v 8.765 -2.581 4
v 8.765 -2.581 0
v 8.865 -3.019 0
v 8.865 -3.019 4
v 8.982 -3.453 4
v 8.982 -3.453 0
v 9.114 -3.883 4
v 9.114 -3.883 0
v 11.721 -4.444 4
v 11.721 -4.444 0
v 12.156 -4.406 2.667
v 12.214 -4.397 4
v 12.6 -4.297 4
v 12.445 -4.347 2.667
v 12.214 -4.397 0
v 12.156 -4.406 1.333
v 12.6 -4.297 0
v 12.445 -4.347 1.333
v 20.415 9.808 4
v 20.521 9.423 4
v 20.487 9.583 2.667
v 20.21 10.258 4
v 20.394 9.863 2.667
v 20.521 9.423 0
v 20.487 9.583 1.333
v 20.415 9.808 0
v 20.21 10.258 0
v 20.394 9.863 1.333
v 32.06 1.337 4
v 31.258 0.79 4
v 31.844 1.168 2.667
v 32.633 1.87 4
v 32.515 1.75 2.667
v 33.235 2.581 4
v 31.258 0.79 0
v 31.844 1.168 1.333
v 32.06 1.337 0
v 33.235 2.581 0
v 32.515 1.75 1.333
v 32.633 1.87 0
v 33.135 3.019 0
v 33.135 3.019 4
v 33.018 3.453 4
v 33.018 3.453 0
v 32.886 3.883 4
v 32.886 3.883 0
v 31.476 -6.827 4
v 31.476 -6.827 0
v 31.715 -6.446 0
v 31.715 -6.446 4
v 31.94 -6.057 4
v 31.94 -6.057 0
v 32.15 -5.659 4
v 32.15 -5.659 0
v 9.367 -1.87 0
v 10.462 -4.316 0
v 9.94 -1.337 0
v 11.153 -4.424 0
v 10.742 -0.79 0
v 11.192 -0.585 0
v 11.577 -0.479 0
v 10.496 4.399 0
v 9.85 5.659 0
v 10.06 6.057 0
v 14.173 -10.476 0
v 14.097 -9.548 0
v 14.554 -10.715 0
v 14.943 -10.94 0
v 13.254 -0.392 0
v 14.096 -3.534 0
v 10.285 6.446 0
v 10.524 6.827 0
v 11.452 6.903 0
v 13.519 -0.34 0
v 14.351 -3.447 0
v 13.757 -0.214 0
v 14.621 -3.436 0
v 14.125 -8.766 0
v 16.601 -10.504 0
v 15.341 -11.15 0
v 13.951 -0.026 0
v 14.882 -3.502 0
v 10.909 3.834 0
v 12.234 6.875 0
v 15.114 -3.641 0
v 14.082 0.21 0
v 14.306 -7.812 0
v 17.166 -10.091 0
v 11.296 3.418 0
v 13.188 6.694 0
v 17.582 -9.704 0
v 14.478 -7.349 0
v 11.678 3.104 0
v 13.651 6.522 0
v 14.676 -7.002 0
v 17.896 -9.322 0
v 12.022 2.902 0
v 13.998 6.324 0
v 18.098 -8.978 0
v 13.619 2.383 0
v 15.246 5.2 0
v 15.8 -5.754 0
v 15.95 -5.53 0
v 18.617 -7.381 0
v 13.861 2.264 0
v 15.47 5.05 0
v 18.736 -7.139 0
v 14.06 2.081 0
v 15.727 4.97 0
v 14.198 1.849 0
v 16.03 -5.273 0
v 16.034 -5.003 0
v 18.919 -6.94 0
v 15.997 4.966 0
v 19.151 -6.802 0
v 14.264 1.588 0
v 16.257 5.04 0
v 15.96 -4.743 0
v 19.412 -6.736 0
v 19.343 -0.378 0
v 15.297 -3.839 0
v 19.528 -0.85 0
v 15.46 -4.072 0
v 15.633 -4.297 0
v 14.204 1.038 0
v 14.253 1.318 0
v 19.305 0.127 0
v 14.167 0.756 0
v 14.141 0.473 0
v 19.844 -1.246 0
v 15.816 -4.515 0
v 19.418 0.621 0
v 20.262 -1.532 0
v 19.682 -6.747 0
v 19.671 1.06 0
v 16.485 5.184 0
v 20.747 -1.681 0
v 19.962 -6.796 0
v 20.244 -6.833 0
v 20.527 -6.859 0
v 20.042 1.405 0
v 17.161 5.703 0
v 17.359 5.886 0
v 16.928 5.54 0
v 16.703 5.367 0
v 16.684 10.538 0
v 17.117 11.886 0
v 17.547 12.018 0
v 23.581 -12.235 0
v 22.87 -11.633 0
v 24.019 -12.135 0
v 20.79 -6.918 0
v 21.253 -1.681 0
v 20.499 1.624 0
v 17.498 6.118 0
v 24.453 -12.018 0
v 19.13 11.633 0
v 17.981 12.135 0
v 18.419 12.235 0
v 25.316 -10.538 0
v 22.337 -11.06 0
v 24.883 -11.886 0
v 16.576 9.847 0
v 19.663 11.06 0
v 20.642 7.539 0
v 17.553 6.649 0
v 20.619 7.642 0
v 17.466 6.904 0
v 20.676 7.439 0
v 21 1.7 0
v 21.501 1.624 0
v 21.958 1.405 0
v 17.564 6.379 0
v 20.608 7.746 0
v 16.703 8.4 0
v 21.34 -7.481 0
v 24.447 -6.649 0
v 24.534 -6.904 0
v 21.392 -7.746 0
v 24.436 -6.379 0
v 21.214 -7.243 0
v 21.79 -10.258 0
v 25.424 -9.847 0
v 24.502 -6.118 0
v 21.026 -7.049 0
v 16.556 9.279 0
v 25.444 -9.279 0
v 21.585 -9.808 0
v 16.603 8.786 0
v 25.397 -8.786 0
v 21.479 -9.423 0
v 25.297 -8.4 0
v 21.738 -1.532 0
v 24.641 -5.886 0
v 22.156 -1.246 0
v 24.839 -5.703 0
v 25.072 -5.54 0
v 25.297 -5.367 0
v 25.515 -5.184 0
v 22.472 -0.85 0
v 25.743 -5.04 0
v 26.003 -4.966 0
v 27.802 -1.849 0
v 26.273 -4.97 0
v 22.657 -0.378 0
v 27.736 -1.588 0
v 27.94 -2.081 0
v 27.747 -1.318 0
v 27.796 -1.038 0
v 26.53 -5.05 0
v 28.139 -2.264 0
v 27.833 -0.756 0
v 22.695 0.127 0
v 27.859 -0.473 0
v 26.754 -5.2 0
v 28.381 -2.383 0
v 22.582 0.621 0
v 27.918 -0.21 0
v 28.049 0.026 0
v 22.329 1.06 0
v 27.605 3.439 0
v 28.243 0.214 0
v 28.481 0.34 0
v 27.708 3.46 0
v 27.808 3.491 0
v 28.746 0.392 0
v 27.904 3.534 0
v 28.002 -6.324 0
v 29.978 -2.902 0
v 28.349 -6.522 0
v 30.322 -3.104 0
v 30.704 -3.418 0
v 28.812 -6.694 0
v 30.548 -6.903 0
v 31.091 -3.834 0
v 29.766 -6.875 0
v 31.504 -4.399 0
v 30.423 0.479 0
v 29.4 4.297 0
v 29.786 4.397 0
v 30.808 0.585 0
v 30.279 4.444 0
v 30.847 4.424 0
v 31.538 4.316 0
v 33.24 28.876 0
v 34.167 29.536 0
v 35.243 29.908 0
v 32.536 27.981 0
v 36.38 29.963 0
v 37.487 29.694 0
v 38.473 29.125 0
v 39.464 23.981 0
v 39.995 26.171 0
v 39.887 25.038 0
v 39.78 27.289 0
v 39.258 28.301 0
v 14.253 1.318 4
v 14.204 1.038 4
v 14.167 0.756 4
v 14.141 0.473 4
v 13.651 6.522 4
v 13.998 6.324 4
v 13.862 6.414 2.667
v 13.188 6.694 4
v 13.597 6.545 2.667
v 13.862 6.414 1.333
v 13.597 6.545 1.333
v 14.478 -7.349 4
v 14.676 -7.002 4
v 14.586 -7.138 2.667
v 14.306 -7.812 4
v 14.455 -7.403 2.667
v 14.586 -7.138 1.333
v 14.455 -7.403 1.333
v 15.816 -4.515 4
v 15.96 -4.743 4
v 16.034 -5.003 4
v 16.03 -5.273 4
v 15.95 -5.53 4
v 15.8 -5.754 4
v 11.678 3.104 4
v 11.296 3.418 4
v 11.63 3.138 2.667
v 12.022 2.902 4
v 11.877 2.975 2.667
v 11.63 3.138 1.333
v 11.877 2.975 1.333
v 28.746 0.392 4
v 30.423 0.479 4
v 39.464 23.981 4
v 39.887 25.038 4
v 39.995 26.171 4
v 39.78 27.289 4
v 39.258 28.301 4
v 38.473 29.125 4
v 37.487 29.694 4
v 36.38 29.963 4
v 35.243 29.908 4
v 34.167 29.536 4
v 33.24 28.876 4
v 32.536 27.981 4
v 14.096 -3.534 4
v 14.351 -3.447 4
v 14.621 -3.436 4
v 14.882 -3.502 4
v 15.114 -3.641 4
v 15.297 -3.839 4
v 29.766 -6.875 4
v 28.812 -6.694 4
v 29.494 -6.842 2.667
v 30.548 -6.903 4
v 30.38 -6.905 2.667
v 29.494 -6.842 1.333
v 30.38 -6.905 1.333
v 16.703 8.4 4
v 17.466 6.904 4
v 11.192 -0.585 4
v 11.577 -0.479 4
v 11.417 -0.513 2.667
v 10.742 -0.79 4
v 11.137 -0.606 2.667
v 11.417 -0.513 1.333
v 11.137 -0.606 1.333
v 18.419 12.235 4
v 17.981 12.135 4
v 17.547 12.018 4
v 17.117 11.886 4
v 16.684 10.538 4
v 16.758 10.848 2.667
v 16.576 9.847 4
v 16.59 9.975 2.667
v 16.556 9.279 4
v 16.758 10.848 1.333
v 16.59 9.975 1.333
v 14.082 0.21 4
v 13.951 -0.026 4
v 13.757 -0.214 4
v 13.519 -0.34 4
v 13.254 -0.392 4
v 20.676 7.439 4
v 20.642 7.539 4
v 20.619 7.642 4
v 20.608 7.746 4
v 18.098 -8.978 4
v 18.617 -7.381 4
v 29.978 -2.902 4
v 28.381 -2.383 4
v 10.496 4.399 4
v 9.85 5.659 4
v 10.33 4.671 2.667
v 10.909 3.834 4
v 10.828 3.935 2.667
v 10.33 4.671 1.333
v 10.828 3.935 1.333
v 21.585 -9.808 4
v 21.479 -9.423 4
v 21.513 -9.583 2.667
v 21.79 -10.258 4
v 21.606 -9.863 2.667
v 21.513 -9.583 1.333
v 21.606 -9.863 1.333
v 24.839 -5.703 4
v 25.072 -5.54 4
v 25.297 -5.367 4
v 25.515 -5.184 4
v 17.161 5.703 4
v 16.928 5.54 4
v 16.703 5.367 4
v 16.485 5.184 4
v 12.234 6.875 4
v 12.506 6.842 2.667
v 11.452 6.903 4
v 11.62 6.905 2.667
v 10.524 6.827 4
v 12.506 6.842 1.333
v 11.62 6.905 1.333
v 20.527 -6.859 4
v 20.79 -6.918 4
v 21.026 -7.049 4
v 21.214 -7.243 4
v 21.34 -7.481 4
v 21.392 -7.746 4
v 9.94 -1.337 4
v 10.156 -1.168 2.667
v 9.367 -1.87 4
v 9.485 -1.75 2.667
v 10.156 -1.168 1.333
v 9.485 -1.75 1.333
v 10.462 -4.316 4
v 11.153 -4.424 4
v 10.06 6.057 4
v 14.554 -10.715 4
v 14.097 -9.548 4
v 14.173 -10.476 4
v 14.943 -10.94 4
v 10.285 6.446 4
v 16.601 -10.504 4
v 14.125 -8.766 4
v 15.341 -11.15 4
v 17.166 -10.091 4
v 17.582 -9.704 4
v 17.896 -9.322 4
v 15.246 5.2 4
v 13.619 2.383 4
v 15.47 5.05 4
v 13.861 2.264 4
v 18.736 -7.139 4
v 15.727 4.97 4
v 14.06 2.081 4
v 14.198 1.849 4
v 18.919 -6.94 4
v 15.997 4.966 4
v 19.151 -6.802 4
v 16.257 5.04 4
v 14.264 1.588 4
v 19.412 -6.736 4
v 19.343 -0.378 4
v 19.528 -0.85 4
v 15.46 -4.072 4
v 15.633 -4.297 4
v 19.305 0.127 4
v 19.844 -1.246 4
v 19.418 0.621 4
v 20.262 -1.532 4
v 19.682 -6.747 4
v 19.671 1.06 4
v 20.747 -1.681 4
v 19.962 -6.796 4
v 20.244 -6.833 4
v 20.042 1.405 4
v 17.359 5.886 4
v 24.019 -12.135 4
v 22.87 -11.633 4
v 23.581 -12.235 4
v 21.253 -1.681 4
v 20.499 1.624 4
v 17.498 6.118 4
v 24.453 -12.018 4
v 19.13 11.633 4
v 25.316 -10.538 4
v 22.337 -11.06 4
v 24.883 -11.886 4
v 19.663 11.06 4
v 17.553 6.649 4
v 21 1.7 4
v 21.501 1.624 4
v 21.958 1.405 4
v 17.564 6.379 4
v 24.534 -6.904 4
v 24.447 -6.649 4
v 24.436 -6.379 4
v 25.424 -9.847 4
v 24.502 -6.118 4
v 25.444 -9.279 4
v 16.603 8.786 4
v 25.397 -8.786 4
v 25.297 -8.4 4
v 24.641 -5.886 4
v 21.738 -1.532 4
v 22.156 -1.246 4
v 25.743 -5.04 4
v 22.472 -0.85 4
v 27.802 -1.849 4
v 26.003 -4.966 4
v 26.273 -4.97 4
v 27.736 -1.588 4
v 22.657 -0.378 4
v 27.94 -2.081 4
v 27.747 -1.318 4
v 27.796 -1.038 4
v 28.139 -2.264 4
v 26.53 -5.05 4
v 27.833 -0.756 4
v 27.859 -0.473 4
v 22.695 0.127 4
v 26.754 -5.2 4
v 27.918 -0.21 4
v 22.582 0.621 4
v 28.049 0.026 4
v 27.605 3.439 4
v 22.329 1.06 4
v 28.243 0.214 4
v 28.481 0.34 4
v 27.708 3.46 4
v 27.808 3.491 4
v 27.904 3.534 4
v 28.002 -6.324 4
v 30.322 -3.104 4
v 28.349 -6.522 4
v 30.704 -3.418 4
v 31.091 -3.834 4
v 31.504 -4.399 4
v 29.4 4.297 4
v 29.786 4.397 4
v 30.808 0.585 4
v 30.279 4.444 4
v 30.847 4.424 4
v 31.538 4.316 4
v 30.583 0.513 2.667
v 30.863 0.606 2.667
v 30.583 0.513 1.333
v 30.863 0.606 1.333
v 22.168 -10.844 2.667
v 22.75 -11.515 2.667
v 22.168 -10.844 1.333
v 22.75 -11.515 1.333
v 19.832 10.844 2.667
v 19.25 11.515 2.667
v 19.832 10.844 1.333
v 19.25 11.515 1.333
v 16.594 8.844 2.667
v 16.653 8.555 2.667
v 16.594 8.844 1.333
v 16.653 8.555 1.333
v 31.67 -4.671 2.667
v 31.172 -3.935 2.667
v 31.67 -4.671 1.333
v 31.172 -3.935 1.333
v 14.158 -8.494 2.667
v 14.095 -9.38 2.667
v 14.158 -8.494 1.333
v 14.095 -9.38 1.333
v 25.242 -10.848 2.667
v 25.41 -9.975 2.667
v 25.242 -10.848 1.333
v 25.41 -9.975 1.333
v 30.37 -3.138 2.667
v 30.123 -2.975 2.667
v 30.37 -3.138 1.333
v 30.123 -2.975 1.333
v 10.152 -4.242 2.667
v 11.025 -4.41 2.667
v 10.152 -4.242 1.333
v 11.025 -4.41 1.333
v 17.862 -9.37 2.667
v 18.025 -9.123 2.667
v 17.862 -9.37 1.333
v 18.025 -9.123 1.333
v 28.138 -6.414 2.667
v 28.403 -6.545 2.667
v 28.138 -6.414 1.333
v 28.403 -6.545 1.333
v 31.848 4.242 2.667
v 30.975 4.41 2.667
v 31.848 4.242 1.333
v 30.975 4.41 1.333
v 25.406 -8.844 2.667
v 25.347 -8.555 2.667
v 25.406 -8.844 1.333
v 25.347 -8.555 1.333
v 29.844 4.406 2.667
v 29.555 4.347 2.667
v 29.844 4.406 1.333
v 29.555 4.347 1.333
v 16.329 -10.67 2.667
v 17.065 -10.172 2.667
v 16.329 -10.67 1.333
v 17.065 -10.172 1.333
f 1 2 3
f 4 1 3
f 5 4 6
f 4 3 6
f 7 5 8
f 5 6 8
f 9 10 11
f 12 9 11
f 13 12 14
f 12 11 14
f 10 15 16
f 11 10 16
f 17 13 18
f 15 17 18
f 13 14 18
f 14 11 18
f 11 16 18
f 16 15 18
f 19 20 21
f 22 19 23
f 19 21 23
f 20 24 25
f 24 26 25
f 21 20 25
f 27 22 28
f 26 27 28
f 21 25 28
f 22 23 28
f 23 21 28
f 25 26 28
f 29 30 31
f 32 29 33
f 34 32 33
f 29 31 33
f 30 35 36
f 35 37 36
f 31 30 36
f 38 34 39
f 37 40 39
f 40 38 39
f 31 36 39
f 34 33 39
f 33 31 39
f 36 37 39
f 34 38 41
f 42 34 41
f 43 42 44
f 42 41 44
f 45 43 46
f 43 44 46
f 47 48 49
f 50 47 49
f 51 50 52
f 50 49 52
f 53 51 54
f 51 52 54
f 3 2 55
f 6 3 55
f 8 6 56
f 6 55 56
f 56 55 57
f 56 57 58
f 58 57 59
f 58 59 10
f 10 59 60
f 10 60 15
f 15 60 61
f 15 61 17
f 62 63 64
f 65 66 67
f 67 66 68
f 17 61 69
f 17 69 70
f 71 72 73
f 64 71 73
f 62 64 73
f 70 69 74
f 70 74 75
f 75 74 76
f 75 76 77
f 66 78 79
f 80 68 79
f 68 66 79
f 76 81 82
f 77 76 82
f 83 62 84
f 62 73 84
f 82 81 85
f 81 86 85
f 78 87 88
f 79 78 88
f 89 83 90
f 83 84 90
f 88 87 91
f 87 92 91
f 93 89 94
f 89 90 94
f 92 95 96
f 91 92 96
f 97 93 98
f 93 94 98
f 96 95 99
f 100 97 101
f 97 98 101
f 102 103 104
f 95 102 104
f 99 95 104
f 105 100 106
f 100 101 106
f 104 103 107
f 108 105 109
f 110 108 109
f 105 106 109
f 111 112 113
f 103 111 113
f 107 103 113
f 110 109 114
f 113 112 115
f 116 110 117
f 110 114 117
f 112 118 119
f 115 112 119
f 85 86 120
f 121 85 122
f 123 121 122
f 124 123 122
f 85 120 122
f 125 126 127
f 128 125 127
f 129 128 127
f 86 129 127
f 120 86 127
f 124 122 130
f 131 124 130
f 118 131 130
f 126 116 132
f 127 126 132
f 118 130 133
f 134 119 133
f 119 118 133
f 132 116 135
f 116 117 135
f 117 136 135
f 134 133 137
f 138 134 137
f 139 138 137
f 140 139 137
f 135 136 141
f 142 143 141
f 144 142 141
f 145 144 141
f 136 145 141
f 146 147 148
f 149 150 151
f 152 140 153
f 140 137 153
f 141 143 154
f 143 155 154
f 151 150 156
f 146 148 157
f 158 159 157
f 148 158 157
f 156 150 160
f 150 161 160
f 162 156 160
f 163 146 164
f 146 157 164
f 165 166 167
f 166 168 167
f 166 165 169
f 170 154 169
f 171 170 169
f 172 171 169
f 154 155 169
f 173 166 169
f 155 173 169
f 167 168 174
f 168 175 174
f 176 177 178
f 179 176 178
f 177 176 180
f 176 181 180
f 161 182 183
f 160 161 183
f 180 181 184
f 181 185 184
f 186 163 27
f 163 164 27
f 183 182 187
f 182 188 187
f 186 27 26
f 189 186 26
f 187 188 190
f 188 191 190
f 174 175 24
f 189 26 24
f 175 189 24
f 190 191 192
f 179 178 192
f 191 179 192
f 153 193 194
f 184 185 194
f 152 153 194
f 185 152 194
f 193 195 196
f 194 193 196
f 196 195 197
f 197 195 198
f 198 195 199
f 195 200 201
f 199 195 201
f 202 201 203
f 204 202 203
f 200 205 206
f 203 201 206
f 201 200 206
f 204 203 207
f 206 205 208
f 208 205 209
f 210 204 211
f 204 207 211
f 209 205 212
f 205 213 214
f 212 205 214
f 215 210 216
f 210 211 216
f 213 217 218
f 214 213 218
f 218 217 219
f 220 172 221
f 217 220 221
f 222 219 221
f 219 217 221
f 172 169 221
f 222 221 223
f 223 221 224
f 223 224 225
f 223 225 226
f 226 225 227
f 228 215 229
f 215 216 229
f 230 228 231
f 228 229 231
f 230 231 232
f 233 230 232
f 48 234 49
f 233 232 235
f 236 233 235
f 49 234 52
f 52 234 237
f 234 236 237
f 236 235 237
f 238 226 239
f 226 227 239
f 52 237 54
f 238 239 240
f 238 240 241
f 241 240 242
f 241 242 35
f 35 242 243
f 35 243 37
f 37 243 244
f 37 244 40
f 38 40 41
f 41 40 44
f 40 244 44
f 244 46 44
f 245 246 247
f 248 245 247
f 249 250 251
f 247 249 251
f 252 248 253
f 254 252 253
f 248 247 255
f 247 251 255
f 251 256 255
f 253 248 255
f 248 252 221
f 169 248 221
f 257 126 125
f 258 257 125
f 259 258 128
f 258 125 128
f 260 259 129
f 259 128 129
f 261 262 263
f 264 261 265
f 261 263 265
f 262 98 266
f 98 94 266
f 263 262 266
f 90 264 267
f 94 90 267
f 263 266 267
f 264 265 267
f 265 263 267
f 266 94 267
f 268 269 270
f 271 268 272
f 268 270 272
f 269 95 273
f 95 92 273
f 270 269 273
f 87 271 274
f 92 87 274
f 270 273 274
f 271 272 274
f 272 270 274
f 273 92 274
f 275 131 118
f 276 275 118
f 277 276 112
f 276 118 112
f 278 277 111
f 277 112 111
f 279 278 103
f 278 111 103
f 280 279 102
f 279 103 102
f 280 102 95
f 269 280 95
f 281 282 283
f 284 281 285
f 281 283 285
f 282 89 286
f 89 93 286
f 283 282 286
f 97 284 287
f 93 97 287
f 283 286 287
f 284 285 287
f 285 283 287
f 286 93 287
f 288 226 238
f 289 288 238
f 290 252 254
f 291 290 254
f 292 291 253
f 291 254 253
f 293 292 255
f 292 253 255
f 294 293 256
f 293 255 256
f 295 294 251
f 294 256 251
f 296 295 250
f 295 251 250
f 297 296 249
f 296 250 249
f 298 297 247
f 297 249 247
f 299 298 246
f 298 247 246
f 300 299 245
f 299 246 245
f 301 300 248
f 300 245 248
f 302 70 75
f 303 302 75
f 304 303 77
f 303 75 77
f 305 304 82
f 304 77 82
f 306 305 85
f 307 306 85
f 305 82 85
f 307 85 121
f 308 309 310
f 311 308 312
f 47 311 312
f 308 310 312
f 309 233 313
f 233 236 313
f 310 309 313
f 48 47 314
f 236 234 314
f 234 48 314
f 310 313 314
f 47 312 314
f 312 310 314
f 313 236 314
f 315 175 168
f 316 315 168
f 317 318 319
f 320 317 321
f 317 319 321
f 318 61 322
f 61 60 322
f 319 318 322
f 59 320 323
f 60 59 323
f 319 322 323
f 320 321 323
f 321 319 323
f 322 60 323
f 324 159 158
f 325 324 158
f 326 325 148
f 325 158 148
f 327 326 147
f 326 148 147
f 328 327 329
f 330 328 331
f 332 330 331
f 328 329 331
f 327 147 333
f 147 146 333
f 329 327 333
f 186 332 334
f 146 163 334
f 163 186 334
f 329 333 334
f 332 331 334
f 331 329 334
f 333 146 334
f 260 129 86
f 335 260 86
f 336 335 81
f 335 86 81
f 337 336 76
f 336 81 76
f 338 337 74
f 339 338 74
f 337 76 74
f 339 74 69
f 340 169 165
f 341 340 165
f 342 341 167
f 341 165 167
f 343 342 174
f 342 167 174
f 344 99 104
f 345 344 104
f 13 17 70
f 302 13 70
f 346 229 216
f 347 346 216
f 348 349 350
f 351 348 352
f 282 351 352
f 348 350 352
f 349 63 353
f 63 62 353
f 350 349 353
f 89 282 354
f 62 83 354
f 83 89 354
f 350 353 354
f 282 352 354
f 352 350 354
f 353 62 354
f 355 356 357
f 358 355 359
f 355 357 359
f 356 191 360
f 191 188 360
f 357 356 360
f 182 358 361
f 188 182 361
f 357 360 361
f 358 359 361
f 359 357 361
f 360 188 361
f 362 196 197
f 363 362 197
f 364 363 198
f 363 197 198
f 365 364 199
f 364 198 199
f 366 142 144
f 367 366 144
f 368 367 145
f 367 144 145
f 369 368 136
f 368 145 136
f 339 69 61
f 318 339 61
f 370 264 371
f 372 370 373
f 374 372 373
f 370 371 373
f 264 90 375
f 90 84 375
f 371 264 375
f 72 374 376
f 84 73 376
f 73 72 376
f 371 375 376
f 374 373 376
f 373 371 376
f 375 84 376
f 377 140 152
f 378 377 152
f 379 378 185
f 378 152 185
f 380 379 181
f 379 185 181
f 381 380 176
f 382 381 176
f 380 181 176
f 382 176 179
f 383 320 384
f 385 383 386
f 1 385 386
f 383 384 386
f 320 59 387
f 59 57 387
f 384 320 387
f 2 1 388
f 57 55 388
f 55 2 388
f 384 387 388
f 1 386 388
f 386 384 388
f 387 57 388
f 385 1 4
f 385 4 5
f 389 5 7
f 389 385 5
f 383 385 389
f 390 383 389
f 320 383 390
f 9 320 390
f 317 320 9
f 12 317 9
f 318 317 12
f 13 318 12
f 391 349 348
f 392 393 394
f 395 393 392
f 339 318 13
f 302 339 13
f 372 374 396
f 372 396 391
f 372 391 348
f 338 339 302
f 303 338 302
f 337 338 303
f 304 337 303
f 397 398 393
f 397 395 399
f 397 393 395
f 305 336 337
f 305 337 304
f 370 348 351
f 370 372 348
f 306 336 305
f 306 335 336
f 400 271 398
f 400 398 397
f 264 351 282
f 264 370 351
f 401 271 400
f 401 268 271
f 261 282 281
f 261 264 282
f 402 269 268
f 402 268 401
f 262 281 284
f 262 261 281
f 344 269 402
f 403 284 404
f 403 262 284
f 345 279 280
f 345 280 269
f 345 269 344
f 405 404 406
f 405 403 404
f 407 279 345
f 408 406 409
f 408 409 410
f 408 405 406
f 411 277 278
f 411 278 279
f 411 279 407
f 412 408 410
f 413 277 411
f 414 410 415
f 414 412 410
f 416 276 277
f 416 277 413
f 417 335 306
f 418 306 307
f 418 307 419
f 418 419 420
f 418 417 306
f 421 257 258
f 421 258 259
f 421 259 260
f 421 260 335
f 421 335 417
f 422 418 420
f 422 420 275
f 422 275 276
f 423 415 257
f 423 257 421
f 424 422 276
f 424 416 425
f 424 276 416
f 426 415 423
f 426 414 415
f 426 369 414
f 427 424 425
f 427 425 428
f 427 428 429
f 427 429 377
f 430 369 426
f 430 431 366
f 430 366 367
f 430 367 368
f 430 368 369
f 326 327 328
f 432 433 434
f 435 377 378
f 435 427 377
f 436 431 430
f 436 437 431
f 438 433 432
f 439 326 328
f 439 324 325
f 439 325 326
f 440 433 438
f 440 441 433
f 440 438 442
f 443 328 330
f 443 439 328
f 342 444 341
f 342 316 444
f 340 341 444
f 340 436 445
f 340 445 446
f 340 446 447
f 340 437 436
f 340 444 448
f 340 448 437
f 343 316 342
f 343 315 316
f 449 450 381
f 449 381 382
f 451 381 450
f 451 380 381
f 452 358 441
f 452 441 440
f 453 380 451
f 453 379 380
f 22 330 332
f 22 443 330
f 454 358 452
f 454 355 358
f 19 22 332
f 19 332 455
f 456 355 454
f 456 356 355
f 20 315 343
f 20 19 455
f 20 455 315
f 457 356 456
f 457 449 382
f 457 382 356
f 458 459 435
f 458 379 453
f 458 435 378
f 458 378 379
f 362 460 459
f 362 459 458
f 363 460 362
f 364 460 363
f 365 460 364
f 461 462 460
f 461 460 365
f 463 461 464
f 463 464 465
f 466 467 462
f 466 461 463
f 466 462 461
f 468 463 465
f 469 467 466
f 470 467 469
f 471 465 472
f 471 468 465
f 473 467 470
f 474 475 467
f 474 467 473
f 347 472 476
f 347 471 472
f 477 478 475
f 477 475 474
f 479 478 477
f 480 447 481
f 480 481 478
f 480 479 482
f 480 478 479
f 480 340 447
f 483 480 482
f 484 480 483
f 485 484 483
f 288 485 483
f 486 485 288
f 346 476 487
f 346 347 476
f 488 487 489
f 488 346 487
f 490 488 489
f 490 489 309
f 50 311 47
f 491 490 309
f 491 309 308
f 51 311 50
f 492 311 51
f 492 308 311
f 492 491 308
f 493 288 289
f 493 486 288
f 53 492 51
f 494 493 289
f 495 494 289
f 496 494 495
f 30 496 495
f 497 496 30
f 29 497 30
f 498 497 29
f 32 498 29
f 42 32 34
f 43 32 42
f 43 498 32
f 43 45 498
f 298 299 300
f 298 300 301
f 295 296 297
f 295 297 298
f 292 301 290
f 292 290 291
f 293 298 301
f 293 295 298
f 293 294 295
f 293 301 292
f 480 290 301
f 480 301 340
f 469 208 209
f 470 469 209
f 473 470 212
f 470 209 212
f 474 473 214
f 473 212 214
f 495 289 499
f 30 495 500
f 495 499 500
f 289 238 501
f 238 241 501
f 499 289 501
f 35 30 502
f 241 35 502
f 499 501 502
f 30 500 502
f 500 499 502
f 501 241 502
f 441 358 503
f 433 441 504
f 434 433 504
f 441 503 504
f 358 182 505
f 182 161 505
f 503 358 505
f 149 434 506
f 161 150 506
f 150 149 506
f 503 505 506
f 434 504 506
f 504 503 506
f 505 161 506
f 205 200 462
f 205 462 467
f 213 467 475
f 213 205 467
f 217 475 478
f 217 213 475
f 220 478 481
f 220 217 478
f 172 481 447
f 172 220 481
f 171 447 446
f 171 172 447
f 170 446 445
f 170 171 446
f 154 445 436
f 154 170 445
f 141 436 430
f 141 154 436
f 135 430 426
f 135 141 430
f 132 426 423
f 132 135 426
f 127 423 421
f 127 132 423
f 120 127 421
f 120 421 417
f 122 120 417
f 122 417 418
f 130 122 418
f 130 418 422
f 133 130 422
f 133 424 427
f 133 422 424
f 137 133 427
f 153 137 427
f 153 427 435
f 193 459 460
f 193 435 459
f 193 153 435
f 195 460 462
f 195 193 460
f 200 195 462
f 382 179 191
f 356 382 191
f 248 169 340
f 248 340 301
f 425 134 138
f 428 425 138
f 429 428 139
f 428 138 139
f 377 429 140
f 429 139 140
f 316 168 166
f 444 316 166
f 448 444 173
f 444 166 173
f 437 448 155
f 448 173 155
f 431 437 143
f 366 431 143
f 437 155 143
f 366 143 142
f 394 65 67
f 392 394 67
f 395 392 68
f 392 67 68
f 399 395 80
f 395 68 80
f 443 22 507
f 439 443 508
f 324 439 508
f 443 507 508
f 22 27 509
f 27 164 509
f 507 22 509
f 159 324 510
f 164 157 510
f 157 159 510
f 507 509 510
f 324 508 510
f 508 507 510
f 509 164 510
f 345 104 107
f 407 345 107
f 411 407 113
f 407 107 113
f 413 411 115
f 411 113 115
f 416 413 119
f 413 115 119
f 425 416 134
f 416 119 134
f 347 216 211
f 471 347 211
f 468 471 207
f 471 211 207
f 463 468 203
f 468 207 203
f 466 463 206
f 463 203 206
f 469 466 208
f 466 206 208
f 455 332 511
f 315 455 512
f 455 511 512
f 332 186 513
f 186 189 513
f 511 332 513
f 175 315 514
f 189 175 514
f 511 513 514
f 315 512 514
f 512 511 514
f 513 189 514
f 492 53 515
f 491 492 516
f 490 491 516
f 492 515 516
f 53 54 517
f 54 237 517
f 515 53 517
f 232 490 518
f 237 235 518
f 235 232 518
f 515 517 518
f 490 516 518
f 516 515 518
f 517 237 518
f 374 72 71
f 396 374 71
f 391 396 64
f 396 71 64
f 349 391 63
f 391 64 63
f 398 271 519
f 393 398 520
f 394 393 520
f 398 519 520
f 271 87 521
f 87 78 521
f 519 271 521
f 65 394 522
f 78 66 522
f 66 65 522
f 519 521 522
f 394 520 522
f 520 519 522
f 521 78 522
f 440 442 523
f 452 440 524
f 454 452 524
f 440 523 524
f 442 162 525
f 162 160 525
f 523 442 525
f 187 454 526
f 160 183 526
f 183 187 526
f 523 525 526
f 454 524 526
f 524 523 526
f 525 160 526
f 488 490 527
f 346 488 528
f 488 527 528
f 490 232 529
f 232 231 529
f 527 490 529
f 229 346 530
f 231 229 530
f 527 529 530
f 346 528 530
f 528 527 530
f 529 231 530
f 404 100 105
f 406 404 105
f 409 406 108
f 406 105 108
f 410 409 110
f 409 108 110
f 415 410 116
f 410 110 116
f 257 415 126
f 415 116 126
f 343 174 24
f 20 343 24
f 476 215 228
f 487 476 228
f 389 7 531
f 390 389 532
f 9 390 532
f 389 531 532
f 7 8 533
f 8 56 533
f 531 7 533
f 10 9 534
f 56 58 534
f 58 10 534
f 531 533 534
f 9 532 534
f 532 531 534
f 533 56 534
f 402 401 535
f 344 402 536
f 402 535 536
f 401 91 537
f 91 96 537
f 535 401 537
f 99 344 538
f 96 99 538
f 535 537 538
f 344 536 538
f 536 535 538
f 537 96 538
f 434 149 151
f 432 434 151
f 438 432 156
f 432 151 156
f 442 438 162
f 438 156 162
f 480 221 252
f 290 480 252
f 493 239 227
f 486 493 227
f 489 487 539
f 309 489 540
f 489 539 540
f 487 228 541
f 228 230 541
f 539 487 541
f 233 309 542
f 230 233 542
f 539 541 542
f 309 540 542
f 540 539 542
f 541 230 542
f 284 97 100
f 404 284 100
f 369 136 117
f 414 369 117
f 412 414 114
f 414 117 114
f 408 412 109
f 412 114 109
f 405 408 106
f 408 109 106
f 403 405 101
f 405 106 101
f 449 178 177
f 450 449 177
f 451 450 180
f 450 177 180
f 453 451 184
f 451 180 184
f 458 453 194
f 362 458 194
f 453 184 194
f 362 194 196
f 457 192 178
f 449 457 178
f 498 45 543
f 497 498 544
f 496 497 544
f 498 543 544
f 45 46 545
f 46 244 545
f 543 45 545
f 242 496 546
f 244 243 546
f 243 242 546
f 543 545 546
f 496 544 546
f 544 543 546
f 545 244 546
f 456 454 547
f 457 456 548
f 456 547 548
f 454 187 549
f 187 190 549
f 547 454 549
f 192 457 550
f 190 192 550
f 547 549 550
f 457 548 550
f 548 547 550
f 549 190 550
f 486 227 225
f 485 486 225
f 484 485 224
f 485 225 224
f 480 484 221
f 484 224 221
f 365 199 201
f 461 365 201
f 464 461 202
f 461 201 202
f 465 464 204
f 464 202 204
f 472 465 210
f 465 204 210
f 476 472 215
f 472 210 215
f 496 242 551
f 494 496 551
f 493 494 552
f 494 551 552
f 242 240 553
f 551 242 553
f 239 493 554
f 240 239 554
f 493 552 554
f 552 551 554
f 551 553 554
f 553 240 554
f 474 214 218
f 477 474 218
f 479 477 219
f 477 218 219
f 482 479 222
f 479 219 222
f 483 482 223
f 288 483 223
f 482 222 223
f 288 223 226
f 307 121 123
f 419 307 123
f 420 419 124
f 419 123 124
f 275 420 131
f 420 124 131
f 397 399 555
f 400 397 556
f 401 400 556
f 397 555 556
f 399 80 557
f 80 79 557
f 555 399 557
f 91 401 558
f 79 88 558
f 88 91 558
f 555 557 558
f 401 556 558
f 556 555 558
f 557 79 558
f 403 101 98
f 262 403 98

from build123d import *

# Parameters (mm, degrees)
CYLINDER006_R          = 1.7
CYLINDER006_DEPTH      = 10
EXTRUDE011_DEPTH       = 4
EXTRUDE013_DEPTH       = 4
CUT005_PLACEMENT_ANGLE = 30


with BuildPart() as cylinder006:
    # Cylinder006 → Cylinder006 (new body)
    with BuildSketch(Plane(origin=(21, 0, -4), x_dir=(1, 0, 0), z_dir=(0, 0, 1))):
        Circle(CYLINDER006_R)
    extrude(amount=CYLINDER006_DEPTH)


with BuildPart() as extrude011:
    # InvoluteGear004 → Extrude011 (new body)
    with BuildSketch(Plane.XY):
        with BuildLine():
            Line((7.583619, -1.626335), (9.226112, -1.976129))
            add(Edge.make_bspline(
                [(9.226112, -1.976129), (9.323588, -1.988042), (9.615448, -2.006593), (10.112858, -1.891348)],
                knots=[0, 0, 0, 0, 1, 1, 1, 1], degree=3))
            add(Edge.make_bspline(
                [(10.112858, -1.891348), (10.701098, -1.749257), (11.528547, -1.419904), (12.486309, -0.674071)],
                knots=[0, 0, 0, 0, 1, 1, 1, 1], degree=3))
            ThreePointArc((12.486309, -0.674071), (12.504498, 0), (12.486309, 0.674071))
            add(Edge.make_bspline(
                [(12.486309, 0.674071), (11.528547, 1.419904), (10.701098, 1.749257), (10.112858, 1.891348)],
                knots=[0, 0, 0, 0, 1, 1, 1, 1], degree=3))
            add(Edge.make_bspline(
                [(10.112858, 1.891348), (9.615448, 2.006593), (9.323588, 1.988042), (9.226112, 1.976129)],
                knots=[0, 0, 0, 0, 1, 1, 1, 1], degree=3))
            Line((9.226112, 1.976129), (7.583619, 1.626335))
            ThreePointArc((7.583619, 1.626335), (6.928673, 1.725171), (6.502518, 2.232237))
            ThreePointArc((6.502518, 2.232237), (6.351672, 2.630949), (6.176404, 3.019545))
            ThreePointArc((6.176404, 3.019545), (6.119192, 3.679432), (6.512421, 4.212436))
            Line((6.512421, 4.212436), (7.92118, 5.126512))
            add(Edge.make_bspline(
                [(7.92118, 5.126512), (7.99853, 5.187015), (8.218024, 5.380273), (8.488255, 5.813485)],
                knots=[0, 0, 0, 0, 1, 1, 1, 1], degree=3))
            add(Edge.make_bspline(
                [(8.488255, 5.813485), (8.803731, 6.329908), (9.155937, 7.14789), (9.305795, 8.352514)],
                knots=[0, 0, 0, 0, 1, 1, 1, 1], degree=3))
            ThreePointArc((9.305795, 8.352514), (8.842015, 8.842015), (8.352514, 9.305795))
            add(Edge.make_bspline(
                [(8.352514, 9.305795), (7.14789, 9.155937), (6.329908, 8.803731), (5.813485, 8.488255)],
                knots=[0, 0, 0, 0, 1, 1, 1, 1], degree=3))
            add(Edge.make_bspline(
                [(5.813485, 8.488255), (5.380273, 8.218024), (5.187015, 7.99853), (5.126512, 7.92118)],
                knots=[0, 0, 0, 0, 1, 1, 1, 1], degree=3))
            Line((5.126512, 7.92118), (4.212436, 6.512421))
            ThreePointArc((4.212436, 6.512421), (3.679432, 6.119192), (3.019545, 6.176404))
            ThreePointArc((3.019545, 6.176404), (2.630949, 6.351672), (2.232237, 6.502518))
            ThreePointArc((2.232237, 6.502518), (1.725171, 6.928673), (1.626335, 7.583619))
            Line((1.626335, 7.583619), (1.976129, 9.226112))
            add(Edge.make_bspline(
                [(1.976129, 9.226112), (1.988042, 9.323588), (2.006593, 9.615448), (1.891348, 10.112858)],
                knots=[0, 0, 0, 0, 1, 1, 1, 1], degree=3))
            add(Edge.make_bspline(
                [(1.891348, 10.112858), (1.749257, 10.701098), (1.419904, 11.528547), (0.674071, 12.486309)],
                knots=[0, 0, 0, 0, 1, 1, 1, 1], degree=3))
            ThreePointArc((0.674071, 12.486309), (0, 12.504498), (-0.674071, 12.486309))
            add(Edge.make_bspline(
                [(-0.674071, 12.486309), (-1.419904, 11.528547), (-1.749257, 10.701098), (-1.891348, 10.112858)],
                knots=[0, 0, 0, 0, 1, 1, 1, 1], degree=3))
            add(Edge.make_bspline(
                [(-1.891348, 10.112858), (-2.006593, 9.615448), (-1.988042, 9.323588), (-1.976129, 9.226112)],
                knots=[0, 0, 0, 0, 1, 1, 1, 1], degree=3))
            Line((-1.976129, 9.226112), (-1.626335, 7.583619))
            ThreePointArc((-1.626335, 7.583619), (-1.725171, 6.928673), (-2.232237, 6.502518))
            ThreePointArc((-2.232237, 6.502518), (-2.630949, 6.351672), (-3.019545, 6.176404))
            ThreePointArc((-3.019545, 6.176404), (-3.679432, 6.119192), (-4.212436, 6.512421))
            Line((-4.212436, 6.512421), (-5.126512, 7.92118))
            add(Edge.make_bspline(
                [(-5.126512, 7.92118), (-5.187015, 7.99853), (-5.380273, 8.218024), (-5.813485, 8.488255)],
                knots=[0, 0, 0, 0, 1, 1, 1, 1], degree=3))
            add(Edge.make_bspline(
                [(-5.813485, 8.488255), (-6.329908, 8.803731), (-7.14789, 9.155937), (-8.352514, 9.305795)],
                knots=[0, 0, 0, 0, 1, 1, 1, 1], degree=3))
            ThreePointArc((-8.352514, 9.305795), (-8.842015, 8.842015), (-9.305795, 8.352514))
            add(Edge.make_bspline(
                [(-9.305795, 8.352514), (-9.155937, 7.14789), (-8.803731, 6.329908), (-8.488255, 5.813485)],
                knots=[0, 0, 0, 0, 1, 1, 1, 1], degree=3))
            add(Edge.make_bspline(
                [(-8.488255, 5.813485), (-8.218024, 5.380273), (-7.99853, 5.187015), (-7.92118, 5.126512)],
                knots=[0, 0, 0, 0, 1, 1, 1, 1], degree=3))
            Line((-7.92118, 5.126512), (-6.512421, 4.212436))
            ThreePointArc((-6.512421, 4.212436), (-6.119192, 3.679432), (-6.176404, 3.019545))
            ThreePointArc((-6.176404, 3.019545), (-6.351672, 2.630949), (-6.502518, 2.232237))
            ThreePointArc((-6.502518, 2.232237), (-6.928673, 1.725171), (-7.583619, 1.626335))
            Line((-7.583619, 1.626335), (-9.226112, 1.976129))
            add(Edge.make_bspline(
                [(-9.226112, 1.976129), (-9.323588, 1.988042), (-9.615448, 2.006593), (-10.112858, 1.891348)],
                knots=[0, 0, 0, 0, 1, 1, 1, 1], degree=3))
            add(Edge.make_bspline(
                [(-10.112858, 1.891348), (-10.701098, 1.749257), (-11.528547, 1.419904), (-12.486309, 0.674071)],
                knots=[0, 0, 0, 0, 1, 1, 1, 1], degree=3))
            ThreePointArc((-12.486309, 0.674071), (-12.504498, 0), (-12.486309, -0.674071))
            add(Edge.make_bspline(
                [(-12.486309, -0.674071), (-11.528547, -1.419904), (-10.701098, -1.749257), (-10.112858, -1.891348)],
                knots=[0, 0, 0, 0, 1, 1, 1, 1], degree=3))
            add(Edge.make_bspline(
                [(-10.112858, -1.891348), (-9.615448, -2.006593), (-9.323588, -1.988042), (-9.226112, -1.976129)],
                knots=[0, 0, 0, 0, 1, 1, 1, 1], degree=3))
            Line((-9.226112, -1.976129), (-7.583619, -1.626335))
            ThreePointArc((-7.583619, -1.626335), (-6.928673, -1.725171), (-6.502518, -2.232237))
            ThreePointArc((-6.502518, -2.232237), (-6.351672, -2.630949), (-6.176404, -3.019545))
            ThreePointArc((-6.176404, -3.019545), (-6.119192, -3.679432), (-6.512421, -4.212436))
            Line((-6.512421, -4.212436), (-7.92118, -5.126512))
            add(Edge.make_bspline(
                [(-7.92118, -5.126512), (-7.99853, -5.187015), (-8.218024, -5.380273), (-8.488255, -5.813485)],
                knots=[0, 0, 0, 0, 1, 1, 1, 1], degree=3))
            add(Edge.make_bspline(
                [(-8.488255, -5.813485), (-8.803731, -6.329908), (-9.155937, -7.14789), (-9.305795, -8.352514)],
                knots=[0, 0, 0, 0, 1, 1, 1, 1], degree=3))
            ThreePointArc((-9.305795, -8.352514), (-8.842015, -8.842015), (-8.352514, -9.305795))
            add(Edge.make_bspline(
                [(-8.352514, -9.305795), (-7.14789, -9.155937), (-6.329908, -8.803731), (-5.813485, -8.488255)],
                knots=[0, 0, 0, 0, 1, 1, 1, 1], degree=3))
            add(Edge.make_bspline(
                [(-5.813485, -8.488255), (-5.380273, -8.218024), (-5.187015, -7.99853), (-5.126512, -7.92118)],
                knots=[0, 0, 0, 0, 1, 1, 1, 1], degree=3))
            Line((-5.126512, -7.92118), (-4.212436, -6.512421))
            ThreePointArc((-4.212436, -6.512421), (-3.679432, -6.119192), (-3.019545, -6.176404))
            ThreePointArc((-3.019545, -6.176404), (-2.630949, -6.351672), (-2.232237, -6.502518))
            ThreePointArc((-2.232237, -6.502518), (-1.725171, -6.928673), (-1.626335, -7.583619))
            Line((-1.626335, -7.583619), (-1.976129, -9.226112))
            add(Edge.make_bspline(
                [(-1.976129, -9.226112), (-1.988042, -9.323588), (-2.006593, -9.615448), (-1.891348, -10.112858)],
                knots=[0, 0, 0, 0, 1, 1, 1, 1], degree=3))
            add(Edge.make_bspline(
                [(-1.891348, -10.112858), (-1.749257, -10.701098), (-1.419904, -11.528547), (-0.674071, -12.486309)],
                knots=[0, 0, 0, 0, 1, 1, 1, 1], degree=3))
            ThreePointArc((-0.674071, -12.486309), (0, -12.504498), (0.674071, -12.486309))
            add(Edge.make_bspline(
                [(0.674071, -12.486309), (1.419904, -11.528547), (1.749257, -10.701098), (1.891348, -10.112858)],
                knots=[0, 0, 0, 0, 1, 1, 1, 1], degree=3))
            add(Edge.make_bspline(
                [(1.891348, -10.112858), (2.006593, -9.615448), (1.988042, -9.323588), (1.976129, -9.226112)],
                knots=[0, 0, 0, 0, 1, 1, 1, 1], degree=3))
            Line((1.976129, -9.226112), (1.626335, -7.583619))
            ThreePointArc((1.626335, -7.583619), (1.725171, -6.928673), (2.232237, -6.502518))
            ThreePointArc((2.232237, -6.502518), (2.630949, -6.351672), (3.019545, -6.176404))
            ThreePointArc((3.019545, -6.176404), (3.679432, -6.119192), (4.212436, -6.512421))
            Line((4.212436, -6.512421), (5.126512, -7.92118))
            add(Edge.make_bspline(
                [(5.126512, -7.92118), (5.187015, -7.99853), (5.380273, -8.218024), (5.813485, -8.488255)],
                knots=[0, 0, 0, 0, 1, 1, 1, 1], degree=3))
            add(Edge.make_bspline(
                [(5.813485, -8.488255), (6.329908, -8.803731), (7.14789, -9.155937), (8.352514, -9.305795)],
                knots=[0, 0, 0, 0, 1, 1, 1, 1], degree=3))
            ThreePointArc((8.352514, -9.305795), (8.842015, -8.842015), (9.305795, -8.352514))
            add(Edge.make_bspline(
                [(9.305795, -8.352514), (9.155937, -7.14789), (8.803731, -6.329908), (8.488255, -5.813485)],
                knots=[0, 0, 0, 0, 1, 1, 1, 1], degree=3))
            add(Edge.make_bspline(
                [(8.488255, -5.813485), (8.218024, -5.380273), (7.99853, -5.187015), (7.92118, -5.126512)],
                knots=[0, 0, 0, 0, 1, 1, 1, 1], degree=3))
            Line((7.92118, -5.126512), (6.512421, -4.212436))
            ThreePointArc((6.512421, -4.212436), (6.119192, -3.679432), (6.176404, -3.019545))
            ThreePointArc((6.176404, -3.019545), (6.351672, -2.630949), (6.502518, -2.232237))
            ThreePointArc((6.502518, -2.232237), (6.928673, -1.725171), (7.583619, -1.626335))
        make_face()
    extrude(amount=EXTRUDE011_DEPTH)


with BuildPart() as extrude011_1:
    # Extrude011 placement: moved
    add(extrude011.part.moved(Location((21, 0, 0))))


with BuildPart() as cut005:
    # Sketch006 → Extrude013 (new body)
    with BuildSketch(Plane.XY):
        with BuildLine():
            ThreePointArc((-4, 0), (0, -4), (4, 0))
            Line((4, 0), (4, 30))
            ThreePointArc((4, 30), (0, 34), (-4, 30))
            Line((-4, 0), (-4, 30))
        make_face()
    extrude(amount=EXTRUDE013_DEPTH)


with BuildPart() as cut005_1:
    # Extrude013 placement: moved
    add(cut005.part.moved(Location((21, 0, 0))))

    # Fusion003: union Extrude011
    add(extrude011_1.part)

    # Cut005: cut Cylinder006
    add(cylinder006.part, mode=Mode.SUBTRACT)


with BuildPart() as cut005_2:
    # Cut005 placement: moved
    add(cut005_1.part.moved(Location((2.813467, 10.5, 0))).rotate(Axis((2.813467, 10.5, 0), (0, 0, -1)), CUT005_PLACEMENT_ANGLE))


solid = cut005_2.part
